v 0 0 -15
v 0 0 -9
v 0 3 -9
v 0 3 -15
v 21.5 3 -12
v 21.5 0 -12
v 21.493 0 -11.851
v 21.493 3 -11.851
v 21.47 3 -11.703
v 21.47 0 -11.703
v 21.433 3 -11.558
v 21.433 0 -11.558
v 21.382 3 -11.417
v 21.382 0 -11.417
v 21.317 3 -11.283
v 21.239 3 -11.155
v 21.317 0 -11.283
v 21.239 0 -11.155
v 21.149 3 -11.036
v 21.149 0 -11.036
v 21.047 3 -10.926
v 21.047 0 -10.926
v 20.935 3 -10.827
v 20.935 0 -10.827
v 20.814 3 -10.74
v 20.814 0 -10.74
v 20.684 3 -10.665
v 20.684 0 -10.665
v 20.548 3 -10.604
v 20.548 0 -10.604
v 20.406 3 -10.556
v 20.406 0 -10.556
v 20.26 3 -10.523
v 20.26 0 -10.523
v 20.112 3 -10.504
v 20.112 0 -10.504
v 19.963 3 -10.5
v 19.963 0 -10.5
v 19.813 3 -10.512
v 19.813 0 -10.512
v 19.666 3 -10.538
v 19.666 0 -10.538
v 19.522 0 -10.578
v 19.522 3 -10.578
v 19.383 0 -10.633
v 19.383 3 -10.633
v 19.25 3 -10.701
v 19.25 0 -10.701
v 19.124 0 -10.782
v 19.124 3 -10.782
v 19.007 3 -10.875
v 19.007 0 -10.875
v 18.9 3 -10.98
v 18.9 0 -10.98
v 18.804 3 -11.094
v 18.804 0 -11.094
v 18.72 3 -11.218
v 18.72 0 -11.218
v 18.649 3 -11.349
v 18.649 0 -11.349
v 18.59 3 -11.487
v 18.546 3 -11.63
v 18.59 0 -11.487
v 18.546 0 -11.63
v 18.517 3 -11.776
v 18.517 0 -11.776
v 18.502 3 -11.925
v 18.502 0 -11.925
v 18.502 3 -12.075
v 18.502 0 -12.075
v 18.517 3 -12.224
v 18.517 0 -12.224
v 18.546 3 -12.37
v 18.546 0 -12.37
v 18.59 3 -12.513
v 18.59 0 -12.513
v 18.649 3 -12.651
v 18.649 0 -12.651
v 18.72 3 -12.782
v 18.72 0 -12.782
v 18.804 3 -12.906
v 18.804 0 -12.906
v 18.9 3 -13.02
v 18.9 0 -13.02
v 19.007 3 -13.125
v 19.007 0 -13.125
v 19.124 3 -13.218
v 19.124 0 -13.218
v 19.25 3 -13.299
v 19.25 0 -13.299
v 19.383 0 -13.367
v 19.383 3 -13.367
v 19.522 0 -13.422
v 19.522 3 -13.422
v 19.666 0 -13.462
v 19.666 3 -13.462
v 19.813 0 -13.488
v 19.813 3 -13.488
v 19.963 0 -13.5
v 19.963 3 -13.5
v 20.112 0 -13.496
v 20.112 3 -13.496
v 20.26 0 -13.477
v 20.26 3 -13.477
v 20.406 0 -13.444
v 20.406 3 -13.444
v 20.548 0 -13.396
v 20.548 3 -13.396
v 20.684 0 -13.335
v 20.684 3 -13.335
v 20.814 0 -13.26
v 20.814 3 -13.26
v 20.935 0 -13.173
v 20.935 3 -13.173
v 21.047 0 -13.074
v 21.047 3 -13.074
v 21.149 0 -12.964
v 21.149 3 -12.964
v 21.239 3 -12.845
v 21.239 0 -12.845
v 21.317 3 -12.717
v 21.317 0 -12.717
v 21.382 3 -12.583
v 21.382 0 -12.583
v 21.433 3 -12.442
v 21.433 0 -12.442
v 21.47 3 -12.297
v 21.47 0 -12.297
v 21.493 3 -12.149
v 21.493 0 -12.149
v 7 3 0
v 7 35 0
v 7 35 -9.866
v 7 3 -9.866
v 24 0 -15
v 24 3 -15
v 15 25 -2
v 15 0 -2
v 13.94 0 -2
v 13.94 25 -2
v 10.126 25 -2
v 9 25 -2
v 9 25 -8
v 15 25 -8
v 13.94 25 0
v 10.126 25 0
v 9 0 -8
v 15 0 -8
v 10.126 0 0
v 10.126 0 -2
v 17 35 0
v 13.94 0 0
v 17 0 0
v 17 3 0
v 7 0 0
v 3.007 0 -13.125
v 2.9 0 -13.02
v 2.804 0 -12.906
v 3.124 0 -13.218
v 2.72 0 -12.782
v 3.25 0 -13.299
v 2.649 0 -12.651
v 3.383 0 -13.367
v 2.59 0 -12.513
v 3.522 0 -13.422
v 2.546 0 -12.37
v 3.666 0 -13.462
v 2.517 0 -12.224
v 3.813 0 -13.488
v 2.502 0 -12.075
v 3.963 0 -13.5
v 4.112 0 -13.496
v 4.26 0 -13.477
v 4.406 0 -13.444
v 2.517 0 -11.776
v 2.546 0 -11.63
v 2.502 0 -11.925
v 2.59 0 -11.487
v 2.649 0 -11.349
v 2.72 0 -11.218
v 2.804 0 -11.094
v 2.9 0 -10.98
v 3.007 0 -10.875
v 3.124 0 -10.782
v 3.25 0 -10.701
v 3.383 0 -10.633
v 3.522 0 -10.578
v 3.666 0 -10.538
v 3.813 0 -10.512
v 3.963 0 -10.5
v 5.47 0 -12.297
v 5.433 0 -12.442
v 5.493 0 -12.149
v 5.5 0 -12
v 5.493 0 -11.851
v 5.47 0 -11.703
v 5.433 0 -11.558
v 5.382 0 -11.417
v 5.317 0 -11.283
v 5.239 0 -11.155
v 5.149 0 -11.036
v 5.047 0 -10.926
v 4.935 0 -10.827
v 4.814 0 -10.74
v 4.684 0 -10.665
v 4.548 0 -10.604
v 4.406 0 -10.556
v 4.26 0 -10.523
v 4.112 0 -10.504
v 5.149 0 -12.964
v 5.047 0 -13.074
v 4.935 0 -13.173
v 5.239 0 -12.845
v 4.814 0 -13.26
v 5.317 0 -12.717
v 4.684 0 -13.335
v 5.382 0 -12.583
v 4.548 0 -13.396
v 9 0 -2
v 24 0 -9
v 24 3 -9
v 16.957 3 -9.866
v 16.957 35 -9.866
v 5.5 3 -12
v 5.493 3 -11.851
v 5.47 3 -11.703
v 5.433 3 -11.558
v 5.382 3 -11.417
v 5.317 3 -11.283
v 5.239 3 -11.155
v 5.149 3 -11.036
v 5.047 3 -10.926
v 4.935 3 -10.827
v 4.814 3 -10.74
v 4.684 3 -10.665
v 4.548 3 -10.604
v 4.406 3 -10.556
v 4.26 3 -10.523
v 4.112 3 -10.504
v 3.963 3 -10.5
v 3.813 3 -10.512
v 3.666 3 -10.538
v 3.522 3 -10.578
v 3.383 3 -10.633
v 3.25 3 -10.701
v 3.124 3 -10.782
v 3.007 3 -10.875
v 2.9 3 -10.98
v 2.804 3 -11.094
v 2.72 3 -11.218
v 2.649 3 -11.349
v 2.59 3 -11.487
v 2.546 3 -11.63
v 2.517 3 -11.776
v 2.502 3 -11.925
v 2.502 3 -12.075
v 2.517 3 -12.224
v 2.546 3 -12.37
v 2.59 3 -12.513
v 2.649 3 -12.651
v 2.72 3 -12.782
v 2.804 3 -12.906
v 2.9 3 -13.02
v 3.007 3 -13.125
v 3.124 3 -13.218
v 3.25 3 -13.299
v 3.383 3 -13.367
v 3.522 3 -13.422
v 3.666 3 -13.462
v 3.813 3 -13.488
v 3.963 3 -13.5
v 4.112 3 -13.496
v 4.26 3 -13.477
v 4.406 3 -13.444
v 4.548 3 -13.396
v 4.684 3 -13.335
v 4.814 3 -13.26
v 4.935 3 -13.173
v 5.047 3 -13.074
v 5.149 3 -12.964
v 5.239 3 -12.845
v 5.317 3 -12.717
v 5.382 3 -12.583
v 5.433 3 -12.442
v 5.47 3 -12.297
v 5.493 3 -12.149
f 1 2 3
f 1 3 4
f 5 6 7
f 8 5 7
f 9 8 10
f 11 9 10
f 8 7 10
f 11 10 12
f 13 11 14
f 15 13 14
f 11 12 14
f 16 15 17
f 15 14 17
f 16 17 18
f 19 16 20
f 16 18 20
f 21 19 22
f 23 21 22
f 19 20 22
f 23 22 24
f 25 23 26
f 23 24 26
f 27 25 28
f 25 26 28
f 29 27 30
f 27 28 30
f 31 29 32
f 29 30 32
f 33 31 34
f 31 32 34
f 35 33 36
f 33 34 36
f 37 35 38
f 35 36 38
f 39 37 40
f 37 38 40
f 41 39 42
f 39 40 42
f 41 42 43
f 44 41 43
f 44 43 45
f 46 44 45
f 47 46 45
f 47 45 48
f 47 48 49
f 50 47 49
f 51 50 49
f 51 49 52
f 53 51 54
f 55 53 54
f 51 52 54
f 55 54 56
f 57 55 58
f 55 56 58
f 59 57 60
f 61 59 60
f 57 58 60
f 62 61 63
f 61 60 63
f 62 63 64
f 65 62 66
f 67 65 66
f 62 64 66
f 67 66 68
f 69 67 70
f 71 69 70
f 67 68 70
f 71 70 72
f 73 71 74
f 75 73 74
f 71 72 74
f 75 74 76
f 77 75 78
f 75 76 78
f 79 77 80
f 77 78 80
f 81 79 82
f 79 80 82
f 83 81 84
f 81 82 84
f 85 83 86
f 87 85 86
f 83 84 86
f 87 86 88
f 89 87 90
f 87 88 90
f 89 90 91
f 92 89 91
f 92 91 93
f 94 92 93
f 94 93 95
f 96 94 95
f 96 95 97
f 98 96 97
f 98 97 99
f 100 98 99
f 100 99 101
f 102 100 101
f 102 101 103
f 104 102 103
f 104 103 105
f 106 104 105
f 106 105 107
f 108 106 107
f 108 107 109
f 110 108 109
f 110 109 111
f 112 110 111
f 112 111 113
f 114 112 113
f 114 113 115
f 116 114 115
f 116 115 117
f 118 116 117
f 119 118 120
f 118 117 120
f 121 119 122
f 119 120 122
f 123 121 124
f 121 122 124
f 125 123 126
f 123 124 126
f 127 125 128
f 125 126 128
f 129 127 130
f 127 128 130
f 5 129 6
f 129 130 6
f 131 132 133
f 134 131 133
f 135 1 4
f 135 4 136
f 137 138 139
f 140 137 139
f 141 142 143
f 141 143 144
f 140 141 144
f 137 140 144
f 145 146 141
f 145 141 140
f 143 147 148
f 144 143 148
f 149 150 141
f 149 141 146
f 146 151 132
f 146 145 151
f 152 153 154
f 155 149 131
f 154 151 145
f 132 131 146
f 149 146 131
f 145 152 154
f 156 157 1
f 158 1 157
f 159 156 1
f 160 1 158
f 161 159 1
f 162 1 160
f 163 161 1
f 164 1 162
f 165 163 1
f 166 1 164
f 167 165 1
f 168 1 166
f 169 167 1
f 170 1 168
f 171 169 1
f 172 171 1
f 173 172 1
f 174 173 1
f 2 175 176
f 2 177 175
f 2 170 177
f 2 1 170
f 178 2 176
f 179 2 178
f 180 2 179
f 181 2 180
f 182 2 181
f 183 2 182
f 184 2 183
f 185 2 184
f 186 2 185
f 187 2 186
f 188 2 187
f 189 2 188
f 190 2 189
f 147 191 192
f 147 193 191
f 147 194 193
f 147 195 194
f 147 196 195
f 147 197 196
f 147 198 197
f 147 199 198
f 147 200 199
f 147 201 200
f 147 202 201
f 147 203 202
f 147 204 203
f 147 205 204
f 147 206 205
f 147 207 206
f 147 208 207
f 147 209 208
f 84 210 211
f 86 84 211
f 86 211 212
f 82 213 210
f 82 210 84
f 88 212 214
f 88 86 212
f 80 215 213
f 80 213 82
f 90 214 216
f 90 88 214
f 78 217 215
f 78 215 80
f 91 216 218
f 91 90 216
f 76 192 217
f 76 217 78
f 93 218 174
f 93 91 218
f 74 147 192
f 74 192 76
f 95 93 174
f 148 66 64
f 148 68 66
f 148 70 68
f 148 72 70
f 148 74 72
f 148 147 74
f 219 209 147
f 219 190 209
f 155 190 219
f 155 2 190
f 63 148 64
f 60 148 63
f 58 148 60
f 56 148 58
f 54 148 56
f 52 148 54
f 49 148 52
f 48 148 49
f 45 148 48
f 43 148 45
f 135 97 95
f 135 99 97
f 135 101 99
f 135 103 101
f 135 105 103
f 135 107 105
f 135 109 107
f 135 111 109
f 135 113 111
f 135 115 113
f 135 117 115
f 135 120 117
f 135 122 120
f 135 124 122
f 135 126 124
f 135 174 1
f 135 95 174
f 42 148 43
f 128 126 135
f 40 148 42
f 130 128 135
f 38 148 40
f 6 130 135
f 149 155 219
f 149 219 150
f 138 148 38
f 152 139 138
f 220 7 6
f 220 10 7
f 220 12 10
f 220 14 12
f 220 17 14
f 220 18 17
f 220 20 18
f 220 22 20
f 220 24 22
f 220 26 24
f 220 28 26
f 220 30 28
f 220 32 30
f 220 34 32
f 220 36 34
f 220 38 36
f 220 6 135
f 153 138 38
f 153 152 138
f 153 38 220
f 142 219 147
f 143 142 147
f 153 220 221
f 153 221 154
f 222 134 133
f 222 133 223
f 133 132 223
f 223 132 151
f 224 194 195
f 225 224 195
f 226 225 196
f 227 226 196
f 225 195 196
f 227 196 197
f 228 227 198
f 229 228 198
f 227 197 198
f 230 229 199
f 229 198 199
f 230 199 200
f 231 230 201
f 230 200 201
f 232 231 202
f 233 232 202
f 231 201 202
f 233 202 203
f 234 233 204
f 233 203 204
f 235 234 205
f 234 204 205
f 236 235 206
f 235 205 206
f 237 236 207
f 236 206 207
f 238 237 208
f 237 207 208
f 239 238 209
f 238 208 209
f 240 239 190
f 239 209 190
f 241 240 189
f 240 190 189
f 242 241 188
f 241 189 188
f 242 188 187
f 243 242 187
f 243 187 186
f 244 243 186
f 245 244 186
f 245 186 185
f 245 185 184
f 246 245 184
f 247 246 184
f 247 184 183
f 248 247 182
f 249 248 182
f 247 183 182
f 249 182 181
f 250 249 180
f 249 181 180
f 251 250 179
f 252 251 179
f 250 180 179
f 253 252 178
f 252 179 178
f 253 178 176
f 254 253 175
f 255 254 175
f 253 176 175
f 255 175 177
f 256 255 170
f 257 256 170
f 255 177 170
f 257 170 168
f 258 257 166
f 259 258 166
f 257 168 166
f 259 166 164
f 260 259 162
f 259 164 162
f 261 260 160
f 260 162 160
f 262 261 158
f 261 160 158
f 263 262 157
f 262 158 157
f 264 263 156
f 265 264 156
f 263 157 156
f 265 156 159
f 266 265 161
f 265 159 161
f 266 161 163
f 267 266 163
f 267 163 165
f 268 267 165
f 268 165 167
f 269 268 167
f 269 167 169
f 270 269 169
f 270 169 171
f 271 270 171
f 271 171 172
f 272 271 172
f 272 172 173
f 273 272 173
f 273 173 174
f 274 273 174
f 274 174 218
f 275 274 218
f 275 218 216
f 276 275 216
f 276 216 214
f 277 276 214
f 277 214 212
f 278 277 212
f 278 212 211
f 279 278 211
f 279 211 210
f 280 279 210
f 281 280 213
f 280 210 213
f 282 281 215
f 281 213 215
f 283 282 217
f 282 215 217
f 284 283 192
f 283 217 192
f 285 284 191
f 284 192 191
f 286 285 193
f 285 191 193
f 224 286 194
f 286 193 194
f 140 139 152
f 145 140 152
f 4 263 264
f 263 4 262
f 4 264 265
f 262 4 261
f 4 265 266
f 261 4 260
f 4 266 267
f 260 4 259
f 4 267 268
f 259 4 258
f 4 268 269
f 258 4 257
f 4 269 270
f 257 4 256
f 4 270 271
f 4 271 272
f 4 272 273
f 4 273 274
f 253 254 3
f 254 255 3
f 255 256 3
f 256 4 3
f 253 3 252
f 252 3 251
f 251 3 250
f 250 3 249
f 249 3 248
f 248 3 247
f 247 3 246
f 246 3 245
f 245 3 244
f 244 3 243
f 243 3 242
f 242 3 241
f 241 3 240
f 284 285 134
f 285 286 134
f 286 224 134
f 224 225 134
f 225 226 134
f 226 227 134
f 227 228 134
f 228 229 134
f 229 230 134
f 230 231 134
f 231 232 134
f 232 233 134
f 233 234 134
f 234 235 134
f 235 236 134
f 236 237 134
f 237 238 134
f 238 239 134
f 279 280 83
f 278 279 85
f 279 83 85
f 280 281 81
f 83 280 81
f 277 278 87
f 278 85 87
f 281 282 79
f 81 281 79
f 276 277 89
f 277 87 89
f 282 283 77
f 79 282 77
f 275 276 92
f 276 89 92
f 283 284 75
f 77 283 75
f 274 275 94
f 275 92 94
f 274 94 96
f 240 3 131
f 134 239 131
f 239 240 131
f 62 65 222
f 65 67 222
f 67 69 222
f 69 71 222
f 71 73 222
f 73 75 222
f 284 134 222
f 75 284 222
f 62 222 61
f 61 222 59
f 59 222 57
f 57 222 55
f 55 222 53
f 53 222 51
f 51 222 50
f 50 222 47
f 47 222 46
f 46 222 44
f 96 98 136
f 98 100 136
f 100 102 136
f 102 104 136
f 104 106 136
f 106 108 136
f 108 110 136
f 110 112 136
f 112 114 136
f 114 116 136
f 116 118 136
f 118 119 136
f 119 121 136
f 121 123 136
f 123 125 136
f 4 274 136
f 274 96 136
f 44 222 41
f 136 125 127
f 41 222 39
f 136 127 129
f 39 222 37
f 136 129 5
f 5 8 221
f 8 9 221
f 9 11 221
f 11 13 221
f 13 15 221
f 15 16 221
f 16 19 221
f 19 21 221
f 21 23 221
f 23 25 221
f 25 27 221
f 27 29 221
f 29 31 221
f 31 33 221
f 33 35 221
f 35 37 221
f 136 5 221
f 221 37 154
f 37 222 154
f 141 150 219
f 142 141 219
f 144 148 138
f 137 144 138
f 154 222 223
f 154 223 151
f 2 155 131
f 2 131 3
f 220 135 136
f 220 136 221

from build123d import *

# Parameters (mm, degrees)
F0_R     = 1.5
F0_W     = 3.8139913231
F0_H     = 2
F1_DEPTH = 3
F2_DEPTH = 35
F3_DEPTH = 25


with BuildPart() as f1:
    # F0 (on Front) → F1 (new body)
    with BuildSketch(Plane.XZ):
        Polygon((7, -9.8663857207), (7, 0), (0, -9), (0, -15), (24, -15), (24, -9), (17, 0), (16.9568490237, -9.8663857207), align=None)
        with Locations((4, -12)):
            Circle(F0_R, mode=Mode.SUBTRACT)
        with Locations((20, -12)):
            Circle(F0_R, mode=Mode.SUBTRACT)
        Polygon((10.1258195937, 0), (7, 0), (7, -9.8663857207), (16.9568490237, -9.8663857207), (17, 0), (13.9398109168, 0), (13.9398109168, -2), (15, -2), (15, -8), (9, -8), (9, -2), (10.1258195937, -2), align=None)
        with Locations((12.0328152552, -1)):
            Rectangle(F0_W, F0_H)
        Polygon((13.9398109168, -2), (10.1258195937, -2), (9, -2), (9, -8), (15, -8), (15, -2), align=None)
    extrude(amount=-F1_DEPTH)

    # F0 (on Front) → F2 (join)
    with BuildSketch(Plane.XZ):
        Polygon((10.1258195937, 0), (7, 0), (7, -9.8663857207), (16.9568490237, -9.8663857207), (17, 0), (13.9398109168, 0), (13.9398109168, -2), (15, -2), (15, -8), (9, -8), (9, -2), (10.1258195937, -2), align=None)
        Polygon((13.9398109168, -2), (10.1258195937, -2), (9, -2), (9, -8), (15, -8), (15, -2), align=None)
        with Locations((12.0328152552, -1)):
            Rectangle(F0_W, F0_H)
    extrude(amount=-F2_DEPTH)

    # F0 (on Front) → F3 (cut)
    with BuildSketch(Plane.XZ):
        with Locations((12.0328152552, -1)):
            Rectangle(F0_W, F0_H)
        Polygon((13.9398109168, -2), (10.1258195937, -2), (9, -2), (9, -8), (15, -8), (15, -2), align=None)
    extrude(amount=-F3_DEPTH, mode=Mode.SUBTRACT)


solid = f1.part
